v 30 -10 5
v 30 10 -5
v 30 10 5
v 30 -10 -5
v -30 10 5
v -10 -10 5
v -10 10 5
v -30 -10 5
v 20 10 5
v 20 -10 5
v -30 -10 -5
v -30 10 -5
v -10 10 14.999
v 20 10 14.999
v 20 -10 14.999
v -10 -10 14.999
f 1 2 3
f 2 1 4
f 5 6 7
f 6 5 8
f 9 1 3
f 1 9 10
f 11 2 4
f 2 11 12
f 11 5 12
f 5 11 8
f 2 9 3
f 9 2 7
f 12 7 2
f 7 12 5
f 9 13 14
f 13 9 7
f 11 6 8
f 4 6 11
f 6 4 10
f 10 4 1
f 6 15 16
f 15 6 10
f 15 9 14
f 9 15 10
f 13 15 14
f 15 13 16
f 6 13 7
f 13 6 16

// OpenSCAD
cube([60,20,10],true);
translate([5,0,10-0.001])
    cube([30,20,10],true);
cylinder(h=3,r=8);
